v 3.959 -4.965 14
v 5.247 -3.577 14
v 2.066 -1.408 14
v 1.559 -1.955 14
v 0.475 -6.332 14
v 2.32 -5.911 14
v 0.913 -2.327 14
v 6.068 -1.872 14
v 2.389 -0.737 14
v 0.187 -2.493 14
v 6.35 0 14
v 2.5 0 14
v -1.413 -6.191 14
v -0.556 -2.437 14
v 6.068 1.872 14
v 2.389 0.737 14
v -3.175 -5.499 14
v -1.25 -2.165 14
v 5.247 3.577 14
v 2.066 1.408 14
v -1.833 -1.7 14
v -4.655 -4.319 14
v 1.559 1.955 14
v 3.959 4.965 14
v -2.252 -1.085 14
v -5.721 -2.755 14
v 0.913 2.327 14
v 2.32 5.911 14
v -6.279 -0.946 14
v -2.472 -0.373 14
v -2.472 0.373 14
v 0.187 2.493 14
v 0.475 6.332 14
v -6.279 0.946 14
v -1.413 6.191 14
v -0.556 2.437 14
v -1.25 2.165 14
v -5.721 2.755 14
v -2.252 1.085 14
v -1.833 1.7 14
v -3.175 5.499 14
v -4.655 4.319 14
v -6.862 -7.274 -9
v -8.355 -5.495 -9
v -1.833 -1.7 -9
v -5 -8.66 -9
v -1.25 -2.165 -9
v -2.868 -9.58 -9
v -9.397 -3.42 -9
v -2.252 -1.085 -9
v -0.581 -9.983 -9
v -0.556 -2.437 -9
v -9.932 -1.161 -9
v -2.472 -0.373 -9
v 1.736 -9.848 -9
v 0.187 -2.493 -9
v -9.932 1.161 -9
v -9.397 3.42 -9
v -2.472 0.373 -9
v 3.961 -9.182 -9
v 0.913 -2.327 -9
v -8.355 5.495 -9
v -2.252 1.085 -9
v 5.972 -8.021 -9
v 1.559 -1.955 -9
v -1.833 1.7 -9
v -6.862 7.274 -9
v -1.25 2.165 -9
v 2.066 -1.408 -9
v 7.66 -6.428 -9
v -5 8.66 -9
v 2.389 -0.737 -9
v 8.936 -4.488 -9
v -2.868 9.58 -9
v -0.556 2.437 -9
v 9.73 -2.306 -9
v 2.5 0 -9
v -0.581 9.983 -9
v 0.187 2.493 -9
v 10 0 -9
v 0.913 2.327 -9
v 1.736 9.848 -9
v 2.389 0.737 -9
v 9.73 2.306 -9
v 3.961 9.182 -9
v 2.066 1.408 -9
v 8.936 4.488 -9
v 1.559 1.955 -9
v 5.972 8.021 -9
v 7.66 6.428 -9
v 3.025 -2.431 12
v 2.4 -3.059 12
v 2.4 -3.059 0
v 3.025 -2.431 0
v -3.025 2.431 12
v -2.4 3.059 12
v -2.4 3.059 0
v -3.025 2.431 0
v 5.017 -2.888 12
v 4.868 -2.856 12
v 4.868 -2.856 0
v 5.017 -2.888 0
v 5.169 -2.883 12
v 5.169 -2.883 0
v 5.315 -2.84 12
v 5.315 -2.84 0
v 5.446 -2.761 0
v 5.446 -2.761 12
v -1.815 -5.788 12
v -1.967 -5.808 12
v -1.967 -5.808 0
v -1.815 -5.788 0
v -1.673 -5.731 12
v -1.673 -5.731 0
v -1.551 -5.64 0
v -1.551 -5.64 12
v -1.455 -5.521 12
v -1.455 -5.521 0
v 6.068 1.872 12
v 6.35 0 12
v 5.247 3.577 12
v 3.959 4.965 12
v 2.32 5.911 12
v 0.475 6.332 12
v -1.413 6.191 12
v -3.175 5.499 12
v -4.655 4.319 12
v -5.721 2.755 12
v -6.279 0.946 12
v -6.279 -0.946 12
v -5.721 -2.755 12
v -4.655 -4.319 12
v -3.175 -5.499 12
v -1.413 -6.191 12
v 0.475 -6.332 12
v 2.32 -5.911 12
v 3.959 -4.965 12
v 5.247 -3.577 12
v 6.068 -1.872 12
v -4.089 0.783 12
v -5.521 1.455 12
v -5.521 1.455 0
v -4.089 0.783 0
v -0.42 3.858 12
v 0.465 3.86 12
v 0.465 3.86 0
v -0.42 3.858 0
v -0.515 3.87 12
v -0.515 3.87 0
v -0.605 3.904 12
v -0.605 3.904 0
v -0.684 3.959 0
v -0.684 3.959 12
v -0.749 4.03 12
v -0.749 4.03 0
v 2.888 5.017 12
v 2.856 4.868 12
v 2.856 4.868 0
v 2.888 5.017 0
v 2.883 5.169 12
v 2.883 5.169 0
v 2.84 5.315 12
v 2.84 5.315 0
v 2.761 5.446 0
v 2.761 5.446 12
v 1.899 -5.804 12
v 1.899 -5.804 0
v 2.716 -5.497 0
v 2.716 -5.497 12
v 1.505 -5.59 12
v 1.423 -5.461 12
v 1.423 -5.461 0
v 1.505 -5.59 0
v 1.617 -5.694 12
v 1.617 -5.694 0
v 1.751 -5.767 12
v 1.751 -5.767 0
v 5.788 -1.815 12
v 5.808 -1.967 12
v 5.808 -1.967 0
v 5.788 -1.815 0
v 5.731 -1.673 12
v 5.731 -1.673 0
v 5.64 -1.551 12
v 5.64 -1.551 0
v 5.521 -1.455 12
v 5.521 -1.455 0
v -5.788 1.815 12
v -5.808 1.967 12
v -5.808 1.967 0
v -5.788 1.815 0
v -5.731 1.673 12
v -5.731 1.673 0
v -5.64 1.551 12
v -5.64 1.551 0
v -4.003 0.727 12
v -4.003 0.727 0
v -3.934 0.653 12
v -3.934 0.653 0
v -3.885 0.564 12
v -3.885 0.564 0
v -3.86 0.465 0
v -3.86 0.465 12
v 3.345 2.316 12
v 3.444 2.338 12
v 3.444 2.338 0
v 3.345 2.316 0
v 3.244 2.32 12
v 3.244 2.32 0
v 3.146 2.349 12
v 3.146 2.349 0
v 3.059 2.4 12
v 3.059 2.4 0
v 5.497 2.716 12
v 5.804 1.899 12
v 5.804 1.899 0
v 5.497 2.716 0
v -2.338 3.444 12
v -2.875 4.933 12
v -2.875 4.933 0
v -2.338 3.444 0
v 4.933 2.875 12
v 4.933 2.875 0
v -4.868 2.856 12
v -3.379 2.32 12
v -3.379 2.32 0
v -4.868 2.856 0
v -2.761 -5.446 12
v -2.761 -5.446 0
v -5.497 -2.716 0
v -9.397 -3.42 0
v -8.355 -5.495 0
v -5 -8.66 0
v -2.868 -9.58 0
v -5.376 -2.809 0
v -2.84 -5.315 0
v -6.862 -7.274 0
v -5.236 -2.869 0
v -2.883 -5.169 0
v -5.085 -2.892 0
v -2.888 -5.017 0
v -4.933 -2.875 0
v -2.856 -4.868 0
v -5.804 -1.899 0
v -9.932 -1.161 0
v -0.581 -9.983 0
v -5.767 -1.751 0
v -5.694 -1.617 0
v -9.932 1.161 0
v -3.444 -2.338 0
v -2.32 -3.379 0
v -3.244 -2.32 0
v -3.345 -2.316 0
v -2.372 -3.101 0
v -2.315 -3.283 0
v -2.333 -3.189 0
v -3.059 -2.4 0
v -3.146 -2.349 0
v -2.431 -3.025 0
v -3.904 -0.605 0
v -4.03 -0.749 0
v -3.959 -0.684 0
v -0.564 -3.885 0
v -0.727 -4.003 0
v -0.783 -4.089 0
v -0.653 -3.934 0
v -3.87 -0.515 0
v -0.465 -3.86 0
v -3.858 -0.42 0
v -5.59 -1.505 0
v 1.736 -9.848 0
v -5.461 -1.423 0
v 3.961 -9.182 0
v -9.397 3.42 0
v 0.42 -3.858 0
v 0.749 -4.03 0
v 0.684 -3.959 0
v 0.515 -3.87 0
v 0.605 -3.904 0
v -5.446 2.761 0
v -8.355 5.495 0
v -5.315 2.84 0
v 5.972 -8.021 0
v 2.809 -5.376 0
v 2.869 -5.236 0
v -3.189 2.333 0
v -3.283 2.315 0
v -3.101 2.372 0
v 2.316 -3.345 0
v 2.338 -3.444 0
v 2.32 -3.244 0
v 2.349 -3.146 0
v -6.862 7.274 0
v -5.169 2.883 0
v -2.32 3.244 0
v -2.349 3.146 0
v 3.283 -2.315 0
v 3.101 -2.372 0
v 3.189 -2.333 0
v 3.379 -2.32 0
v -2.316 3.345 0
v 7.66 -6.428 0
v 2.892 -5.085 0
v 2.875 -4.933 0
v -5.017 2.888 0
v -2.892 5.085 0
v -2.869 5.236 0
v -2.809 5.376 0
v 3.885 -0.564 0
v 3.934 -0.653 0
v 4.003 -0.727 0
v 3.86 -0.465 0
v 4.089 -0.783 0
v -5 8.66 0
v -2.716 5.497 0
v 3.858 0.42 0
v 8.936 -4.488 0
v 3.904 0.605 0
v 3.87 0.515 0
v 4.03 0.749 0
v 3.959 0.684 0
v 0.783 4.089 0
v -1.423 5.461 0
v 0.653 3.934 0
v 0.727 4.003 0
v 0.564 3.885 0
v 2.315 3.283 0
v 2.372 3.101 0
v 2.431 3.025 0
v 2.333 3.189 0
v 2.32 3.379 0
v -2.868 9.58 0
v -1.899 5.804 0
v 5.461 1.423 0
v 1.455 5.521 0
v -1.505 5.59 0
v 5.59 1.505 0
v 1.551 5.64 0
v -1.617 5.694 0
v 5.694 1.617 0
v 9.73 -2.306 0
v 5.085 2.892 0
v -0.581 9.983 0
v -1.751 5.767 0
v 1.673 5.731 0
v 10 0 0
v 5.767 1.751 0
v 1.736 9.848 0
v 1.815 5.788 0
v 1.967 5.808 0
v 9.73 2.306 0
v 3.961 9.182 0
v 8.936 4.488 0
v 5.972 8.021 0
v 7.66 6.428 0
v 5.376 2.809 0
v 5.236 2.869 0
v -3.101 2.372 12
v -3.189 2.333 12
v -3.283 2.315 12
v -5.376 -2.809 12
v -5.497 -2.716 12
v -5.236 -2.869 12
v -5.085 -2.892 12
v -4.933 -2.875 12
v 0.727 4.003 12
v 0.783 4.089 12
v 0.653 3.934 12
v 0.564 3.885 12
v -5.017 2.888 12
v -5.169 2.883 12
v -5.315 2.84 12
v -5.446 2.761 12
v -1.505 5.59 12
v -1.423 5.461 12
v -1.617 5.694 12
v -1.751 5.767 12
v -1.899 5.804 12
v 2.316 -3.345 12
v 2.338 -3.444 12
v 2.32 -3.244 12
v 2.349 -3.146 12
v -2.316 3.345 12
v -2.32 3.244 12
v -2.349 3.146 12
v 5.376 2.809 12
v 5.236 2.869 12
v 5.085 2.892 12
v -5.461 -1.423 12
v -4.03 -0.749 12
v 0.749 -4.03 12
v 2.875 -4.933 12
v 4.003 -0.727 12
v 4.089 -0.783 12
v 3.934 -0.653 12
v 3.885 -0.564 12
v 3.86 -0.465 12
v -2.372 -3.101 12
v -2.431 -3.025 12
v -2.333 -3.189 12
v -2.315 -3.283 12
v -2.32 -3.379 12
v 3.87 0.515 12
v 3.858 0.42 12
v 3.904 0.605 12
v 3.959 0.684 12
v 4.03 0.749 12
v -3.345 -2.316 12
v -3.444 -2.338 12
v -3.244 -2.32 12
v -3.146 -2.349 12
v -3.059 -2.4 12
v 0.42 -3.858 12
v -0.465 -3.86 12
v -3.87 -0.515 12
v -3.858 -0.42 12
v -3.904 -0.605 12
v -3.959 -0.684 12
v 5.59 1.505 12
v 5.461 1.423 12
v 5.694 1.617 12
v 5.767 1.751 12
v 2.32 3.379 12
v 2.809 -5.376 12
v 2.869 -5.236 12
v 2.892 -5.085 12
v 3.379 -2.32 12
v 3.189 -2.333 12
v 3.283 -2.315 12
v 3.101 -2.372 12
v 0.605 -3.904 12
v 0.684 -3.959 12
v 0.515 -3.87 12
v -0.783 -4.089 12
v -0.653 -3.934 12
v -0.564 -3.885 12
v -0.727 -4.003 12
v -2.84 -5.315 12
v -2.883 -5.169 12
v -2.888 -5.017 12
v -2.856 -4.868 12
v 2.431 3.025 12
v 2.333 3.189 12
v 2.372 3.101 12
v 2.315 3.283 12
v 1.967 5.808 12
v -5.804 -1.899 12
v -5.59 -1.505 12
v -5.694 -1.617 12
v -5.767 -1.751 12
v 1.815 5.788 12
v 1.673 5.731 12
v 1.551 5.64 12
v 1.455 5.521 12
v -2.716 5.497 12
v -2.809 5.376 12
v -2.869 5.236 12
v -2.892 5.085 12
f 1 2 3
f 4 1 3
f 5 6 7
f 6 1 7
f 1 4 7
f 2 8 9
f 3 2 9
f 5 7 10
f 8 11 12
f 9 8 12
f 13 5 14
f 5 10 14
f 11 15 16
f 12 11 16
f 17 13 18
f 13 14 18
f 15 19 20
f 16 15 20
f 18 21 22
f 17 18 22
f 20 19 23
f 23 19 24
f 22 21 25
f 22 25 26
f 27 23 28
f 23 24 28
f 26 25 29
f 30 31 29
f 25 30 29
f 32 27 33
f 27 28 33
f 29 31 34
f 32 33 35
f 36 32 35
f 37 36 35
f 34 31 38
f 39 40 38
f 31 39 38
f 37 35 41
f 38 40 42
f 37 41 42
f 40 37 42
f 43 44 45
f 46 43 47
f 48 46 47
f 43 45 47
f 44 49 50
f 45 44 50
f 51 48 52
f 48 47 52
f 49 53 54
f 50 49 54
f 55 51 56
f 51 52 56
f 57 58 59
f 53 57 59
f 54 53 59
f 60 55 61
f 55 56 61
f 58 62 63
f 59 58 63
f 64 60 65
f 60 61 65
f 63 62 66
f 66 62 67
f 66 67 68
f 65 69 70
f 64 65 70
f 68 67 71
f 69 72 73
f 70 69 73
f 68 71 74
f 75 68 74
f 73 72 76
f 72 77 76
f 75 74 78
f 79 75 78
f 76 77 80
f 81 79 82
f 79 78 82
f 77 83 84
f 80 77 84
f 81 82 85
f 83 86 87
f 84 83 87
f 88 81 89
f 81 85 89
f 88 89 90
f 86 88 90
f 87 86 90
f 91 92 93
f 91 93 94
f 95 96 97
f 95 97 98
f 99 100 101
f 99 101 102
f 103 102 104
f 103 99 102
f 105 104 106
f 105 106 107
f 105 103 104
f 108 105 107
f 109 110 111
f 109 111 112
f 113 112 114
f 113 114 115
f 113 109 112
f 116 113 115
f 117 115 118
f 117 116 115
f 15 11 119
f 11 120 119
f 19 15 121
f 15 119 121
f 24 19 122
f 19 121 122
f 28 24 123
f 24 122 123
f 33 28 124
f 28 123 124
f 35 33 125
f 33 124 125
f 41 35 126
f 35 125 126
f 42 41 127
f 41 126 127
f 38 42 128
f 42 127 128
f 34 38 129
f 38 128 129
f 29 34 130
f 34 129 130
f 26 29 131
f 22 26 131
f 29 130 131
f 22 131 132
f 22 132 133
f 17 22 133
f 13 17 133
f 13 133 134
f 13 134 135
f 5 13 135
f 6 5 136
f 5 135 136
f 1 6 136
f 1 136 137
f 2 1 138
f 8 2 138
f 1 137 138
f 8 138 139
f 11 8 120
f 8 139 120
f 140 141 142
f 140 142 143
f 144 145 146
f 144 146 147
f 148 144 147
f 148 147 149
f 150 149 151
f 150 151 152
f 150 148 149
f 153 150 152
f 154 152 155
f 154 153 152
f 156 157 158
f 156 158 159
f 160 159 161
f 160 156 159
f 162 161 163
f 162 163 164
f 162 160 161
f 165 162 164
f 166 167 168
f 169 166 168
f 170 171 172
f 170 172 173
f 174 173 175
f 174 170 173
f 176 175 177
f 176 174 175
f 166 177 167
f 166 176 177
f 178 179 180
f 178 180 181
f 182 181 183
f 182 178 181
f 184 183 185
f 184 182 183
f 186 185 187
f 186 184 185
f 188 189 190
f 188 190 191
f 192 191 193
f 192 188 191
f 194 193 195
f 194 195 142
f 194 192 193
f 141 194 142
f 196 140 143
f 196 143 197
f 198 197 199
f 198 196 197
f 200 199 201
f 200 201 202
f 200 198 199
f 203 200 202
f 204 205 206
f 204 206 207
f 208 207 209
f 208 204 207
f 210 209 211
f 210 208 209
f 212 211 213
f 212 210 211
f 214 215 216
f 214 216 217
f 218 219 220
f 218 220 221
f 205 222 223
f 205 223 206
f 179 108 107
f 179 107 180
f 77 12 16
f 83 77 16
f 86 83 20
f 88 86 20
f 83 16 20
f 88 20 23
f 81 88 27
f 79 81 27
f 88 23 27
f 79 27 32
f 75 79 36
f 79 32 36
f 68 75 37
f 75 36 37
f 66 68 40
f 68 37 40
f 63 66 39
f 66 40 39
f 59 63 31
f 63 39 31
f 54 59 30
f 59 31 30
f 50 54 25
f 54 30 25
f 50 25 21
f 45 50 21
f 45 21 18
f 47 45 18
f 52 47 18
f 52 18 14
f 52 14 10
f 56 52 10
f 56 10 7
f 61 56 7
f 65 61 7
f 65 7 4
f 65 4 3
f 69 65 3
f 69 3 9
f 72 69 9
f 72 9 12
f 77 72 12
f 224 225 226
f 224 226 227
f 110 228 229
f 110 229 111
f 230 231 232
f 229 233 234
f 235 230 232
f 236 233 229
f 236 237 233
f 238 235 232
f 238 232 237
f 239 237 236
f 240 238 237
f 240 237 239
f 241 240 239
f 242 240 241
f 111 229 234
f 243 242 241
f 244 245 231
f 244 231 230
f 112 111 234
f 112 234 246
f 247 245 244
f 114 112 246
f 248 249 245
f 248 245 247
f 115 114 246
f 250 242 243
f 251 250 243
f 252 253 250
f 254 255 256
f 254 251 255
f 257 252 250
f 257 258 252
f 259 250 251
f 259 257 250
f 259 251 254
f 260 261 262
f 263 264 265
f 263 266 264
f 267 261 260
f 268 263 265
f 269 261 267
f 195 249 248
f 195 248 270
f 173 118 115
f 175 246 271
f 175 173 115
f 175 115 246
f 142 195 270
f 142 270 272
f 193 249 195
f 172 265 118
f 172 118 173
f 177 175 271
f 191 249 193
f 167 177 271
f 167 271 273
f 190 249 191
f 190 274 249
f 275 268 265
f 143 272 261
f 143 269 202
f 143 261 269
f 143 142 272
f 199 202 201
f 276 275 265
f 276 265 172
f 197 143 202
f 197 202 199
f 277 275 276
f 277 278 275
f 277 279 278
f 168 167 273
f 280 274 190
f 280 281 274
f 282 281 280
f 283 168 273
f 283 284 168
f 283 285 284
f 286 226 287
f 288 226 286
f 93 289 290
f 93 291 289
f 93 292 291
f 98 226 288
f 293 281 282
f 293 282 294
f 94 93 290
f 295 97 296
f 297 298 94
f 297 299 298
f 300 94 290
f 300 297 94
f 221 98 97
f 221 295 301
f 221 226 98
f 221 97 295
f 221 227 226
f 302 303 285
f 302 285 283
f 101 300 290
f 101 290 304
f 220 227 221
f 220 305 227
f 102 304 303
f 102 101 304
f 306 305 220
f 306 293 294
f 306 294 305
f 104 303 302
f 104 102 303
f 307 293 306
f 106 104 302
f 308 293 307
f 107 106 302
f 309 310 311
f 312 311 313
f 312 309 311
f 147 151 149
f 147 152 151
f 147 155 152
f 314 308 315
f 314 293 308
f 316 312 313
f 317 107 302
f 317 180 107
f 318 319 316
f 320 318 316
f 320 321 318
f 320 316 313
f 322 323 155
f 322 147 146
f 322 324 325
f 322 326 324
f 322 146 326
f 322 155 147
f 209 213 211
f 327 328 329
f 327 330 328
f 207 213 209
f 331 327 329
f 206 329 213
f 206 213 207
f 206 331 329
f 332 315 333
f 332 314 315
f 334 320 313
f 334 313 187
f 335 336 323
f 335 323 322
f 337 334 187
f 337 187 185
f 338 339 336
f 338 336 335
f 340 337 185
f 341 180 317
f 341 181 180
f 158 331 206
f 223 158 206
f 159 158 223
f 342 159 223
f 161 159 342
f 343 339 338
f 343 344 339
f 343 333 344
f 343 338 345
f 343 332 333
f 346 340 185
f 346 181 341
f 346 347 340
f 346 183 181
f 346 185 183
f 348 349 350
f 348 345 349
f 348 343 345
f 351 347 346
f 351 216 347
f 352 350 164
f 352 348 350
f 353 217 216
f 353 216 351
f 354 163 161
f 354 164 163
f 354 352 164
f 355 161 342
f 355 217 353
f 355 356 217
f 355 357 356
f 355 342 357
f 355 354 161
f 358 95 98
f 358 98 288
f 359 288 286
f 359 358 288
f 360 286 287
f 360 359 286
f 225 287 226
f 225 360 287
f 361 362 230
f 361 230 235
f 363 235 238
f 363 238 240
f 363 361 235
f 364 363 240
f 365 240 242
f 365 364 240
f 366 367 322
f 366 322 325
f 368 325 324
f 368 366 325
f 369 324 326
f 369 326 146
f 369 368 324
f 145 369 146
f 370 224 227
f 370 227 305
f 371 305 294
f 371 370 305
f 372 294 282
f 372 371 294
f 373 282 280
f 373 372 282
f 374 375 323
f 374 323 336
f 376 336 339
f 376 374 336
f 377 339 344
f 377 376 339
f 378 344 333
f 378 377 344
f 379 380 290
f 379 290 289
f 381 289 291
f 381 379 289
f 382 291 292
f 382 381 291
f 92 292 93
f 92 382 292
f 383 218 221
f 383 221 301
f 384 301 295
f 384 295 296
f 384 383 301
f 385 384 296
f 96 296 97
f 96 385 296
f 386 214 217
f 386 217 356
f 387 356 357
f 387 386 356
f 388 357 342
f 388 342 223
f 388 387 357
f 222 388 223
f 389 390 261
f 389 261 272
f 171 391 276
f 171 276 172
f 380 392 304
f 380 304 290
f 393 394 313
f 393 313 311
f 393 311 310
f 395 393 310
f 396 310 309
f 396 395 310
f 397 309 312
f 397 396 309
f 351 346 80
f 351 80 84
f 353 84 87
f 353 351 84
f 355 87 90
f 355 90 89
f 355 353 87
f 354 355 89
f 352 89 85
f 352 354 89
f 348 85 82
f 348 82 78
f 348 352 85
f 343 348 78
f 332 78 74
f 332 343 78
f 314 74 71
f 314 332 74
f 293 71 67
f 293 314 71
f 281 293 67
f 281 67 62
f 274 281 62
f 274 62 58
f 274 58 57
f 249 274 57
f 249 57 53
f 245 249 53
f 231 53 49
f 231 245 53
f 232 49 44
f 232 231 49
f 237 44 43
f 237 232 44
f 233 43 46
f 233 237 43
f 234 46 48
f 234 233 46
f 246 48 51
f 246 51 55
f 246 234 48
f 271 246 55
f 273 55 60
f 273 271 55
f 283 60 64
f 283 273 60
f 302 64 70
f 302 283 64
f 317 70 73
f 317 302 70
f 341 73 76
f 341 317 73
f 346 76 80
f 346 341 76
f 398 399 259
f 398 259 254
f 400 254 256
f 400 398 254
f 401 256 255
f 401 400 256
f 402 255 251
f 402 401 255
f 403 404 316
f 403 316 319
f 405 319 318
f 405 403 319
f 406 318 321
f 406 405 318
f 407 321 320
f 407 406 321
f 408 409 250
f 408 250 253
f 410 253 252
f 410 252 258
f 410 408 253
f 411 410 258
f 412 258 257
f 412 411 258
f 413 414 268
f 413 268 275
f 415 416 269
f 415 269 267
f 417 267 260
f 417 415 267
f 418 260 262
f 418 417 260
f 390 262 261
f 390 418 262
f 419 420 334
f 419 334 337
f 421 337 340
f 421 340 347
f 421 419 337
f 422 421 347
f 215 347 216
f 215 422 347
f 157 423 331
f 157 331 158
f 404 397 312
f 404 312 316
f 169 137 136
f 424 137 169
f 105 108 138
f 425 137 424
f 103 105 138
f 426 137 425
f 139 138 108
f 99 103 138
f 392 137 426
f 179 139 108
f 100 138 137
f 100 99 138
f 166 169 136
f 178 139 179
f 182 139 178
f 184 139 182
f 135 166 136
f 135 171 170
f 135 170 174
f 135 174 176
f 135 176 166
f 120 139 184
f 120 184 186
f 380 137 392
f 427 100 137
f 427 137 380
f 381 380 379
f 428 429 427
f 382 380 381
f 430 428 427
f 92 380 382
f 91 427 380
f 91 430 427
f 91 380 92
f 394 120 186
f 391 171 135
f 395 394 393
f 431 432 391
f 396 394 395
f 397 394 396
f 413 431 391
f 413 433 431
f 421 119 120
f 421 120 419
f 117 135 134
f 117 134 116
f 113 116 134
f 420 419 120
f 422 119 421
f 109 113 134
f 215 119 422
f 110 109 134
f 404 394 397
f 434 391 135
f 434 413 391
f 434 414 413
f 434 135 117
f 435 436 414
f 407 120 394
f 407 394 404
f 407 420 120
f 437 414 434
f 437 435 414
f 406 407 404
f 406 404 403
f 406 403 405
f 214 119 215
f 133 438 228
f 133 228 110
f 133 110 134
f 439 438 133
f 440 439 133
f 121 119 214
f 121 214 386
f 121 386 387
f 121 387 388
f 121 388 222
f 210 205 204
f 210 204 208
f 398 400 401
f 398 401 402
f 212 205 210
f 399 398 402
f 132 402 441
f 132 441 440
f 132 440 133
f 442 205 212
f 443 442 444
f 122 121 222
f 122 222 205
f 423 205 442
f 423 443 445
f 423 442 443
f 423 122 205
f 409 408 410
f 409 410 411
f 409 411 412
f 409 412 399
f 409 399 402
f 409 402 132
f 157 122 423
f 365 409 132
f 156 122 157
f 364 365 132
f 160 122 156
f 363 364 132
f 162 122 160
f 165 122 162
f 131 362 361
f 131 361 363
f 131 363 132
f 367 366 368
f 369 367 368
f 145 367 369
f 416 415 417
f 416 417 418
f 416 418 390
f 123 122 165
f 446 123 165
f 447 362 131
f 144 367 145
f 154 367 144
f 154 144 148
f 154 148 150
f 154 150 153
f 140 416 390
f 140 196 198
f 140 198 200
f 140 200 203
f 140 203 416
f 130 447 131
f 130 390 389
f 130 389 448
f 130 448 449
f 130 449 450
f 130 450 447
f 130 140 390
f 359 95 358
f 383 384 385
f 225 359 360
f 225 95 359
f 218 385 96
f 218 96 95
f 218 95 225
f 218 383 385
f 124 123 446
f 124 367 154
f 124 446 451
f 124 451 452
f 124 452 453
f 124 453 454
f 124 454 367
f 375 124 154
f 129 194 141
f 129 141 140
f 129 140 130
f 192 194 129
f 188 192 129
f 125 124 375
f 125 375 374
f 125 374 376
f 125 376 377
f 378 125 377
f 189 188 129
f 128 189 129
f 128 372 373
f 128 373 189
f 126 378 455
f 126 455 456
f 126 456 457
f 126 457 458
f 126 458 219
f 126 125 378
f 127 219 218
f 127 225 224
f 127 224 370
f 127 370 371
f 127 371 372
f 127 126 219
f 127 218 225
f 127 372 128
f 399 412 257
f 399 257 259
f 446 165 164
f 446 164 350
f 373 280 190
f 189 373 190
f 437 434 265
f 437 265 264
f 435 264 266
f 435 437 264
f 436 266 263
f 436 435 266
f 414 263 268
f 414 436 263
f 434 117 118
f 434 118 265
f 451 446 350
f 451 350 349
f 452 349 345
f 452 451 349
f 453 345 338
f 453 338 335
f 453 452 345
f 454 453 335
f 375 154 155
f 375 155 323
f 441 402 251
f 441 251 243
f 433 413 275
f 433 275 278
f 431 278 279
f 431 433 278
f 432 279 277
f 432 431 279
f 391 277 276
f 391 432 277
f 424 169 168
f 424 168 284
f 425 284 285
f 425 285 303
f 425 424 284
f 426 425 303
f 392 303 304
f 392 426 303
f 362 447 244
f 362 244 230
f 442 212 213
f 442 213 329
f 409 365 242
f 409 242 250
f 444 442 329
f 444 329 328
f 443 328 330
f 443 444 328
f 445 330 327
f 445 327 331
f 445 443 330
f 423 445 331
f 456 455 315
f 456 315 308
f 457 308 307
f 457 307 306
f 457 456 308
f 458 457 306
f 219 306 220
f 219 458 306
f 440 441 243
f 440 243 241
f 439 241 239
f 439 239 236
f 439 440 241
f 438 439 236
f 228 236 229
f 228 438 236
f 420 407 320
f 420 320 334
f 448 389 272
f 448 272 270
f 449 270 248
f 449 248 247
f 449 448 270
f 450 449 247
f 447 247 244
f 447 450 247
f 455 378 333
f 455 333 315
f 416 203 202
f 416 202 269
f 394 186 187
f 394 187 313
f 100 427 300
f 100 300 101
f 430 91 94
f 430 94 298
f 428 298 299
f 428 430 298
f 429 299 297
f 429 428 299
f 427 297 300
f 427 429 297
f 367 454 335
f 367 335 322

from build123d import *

# Parameters (mm, degrees)
SKETCH1_W                    = 6.35
SKETCH1_H                    = 2
BOSS_EXTRUDE1_DEPTH          = 12
SKETCH3_R                    = 10
BOSS_EXTRUDE2_DEPTH          = 9
F_5_0_5_DIAMETER_HOLE1_D     = 5
F_5_0_5_DIAMETER_HOLE1_DEPTH = 23


with BuildPart() as part:
    # Sketch1 → Revolve1 (revolve)
    with BuildSketch(Plane(origin=(0, 0, 0), x_dir=(1, 0, 0), z_dir=(0, 1, 0))):
        with Locations((3.175, -13)):
            Rectangle(SKETCH1_W, SKETCH1_H)
    revolve(axis=Axis((0, 0, 12), (0, 0, 1)))

    # Sketch2 → Boss-Extrude1 (add)
    with BuildSketch(Plane(origin=(0, 0, 12), x_dir=(-1, 0, 0), z_dir=(0, 0, -1))):
        with BuildLine():
            Line((-2.875186934, -4.932808292), (-2.337585335, -3.444483277))
            ThreePointArc((-2.337585335, -3.444483277), (-2.320135009, -3.243617805), (-2.400419134, -3.058669404))
            Line((-2.400419134, -3.058669404), (-3.024832437, -2.4306198))
            ThreePointArc((-3.024832437, -2.4306198), (-3.188663853, -2.33311555), (-3.378852537, -2.3198462))
            Line((-3.378852537, -2.3198462), (-4.867663341, -2.855580601))
            ThreePointArc((-4.867663341, -2.855580601), (-5.169157529, -2.882959187), (-5.446384241, -2.761329901))
            Line((-5.446384241, -2.761329901), (-5.807587241, -1.966542116))
            ThreePointArc((-5.807587241, -1.966542116), (-5.731084845, -1.673369369), (-5.521086391, -1.454958001))
            Line((-5.521086391, -1.454958001), (-4.088539945, -0.782695026))
            ThreePointArc((-4.088539945, -0.782695026), (-3.934167363, -0.653000933), (-3.860158544, -0.465453215))
            Line((-3.860158544, -0.465453215), (-3.857587291, 0.420171804))
            ThreePointArc((-3.857587291, 0.420171804), (-3.904487679, 0.604964025), (-4.029588541, 0.748830581))
            Line((-4.029588541, 0.748830581), (-5.461158184, 1.422757368))
            ThreePointArc((-5.461158184, 1.422757368), (-5.693706352, 1.61658637), (-5.803730347, 1.89862015))
            Line((-5.803730347, 1.89862015), (-5.497139595, 2.716029083))
            ThreePointArc((-5.497139595, 2.716029083), (-5.235739777, 2.86923814), (-4.93280828, 2.875186941))
            Line((-4.93280828, 2.875186941), (-3.444483265, 2.337585342))
            ThreePointArc((-3.444483265, 2.337585342), (-3.243617793, 2.320135016), (-3.058669391, 2.40041914))
            Line((-3.058669391, 2.40041914), (-2.430619781, 3.024832451))
            ThreePointArc((-2.430619781, 3.024832451), (-2.333115531, 3.188663866), (-2.319846181, 3.378852551))
            Line((-2.319846181, 3.378852551), (-2.855580582, 4.867663354))
            ThreePointArc((-2.855580582, 4.867663354), (-2.882959167, 5.169157543), (-2.761329882, 5.446384254))
            Line((-2.761329882, 5.446384254), (-1.966542082, 5.807587254))
            ThreePointArc((-1.966542082, 5.807587254), (-1.673369335, 5.731084833), (-1.454957982, 5.521086354))
            Line((-1.454957982, 5.521086354), (-0.782695007, 4.088539908))
            ThreePointArc((-0.782695007, 4.088539908), (-0.653000914, 3.934167326), (-0.465453196, 3.860158506))
            Line((-0.465453196, 3.860158506), (0.420171836, 3.857587254))
            ThreePointArc((0.420171836, 3.857587254), (0.604964057, 3.904487642), (0.748830613, 4.029588503))
            Line((0.748830613, 4.029588503), (1.4227574, 5.461158146))
            ThreePointArc((1.4227574, 5.461158146), (1.616586402, 5.693706315), (1.898620182, 5.80373031))
            Line((1.898620182, 5.80373031), (2.716029116, 5.497139558))
            ThreePointArc((2.716029116, 5.497139558), (2.869238173, 5.235739739), (2.875186973, 4.932808242))
            Line((2.875186973, 4.932808242), (2.337585375, 3.444483227))
            ThreePointArc((2.337585375, 3.444483227), (2.320135048, 3.243617755), (2.400419173, 3.058669354))
            Line((2.400419173, 3.058669354), (3.024832497, 2.43061973))
            ThreePointArc((3.024832497, 2.43061973), (3.188663912, 2.33311548), (3.378852597, 2.31984613))
            Line((3.378852597, 2.31984613), (4.8676634, 2.855580531))
            ThreePointArc((4.8676634, 2.855580531), (5.169157589, 2.882959117), (5.4463843, 2.761329831))
            Line((5.4463843, 2.761329831), (5.8075873, 1.966542031))
            ThreePointArc((5.8075873, 1.966542031), (5.731084879, 1.673369284), (5.5210864, 1.454957931))
            Line((5.5210864, 1.454957931), (4.088539954, 0.782694956))
            ThreePointArc((4.088539954, 0.782694956), (3.934167372, 0.653000863), (3.860158552, 0.465453145))
            Line((3.860158552, 0.465453145), (3.8575873, -0.420171864))
            ThreePointArc((3.8575873, -0.420171864), (3.904487688, -0.604964085), (4.029588549, -0.748830641))
            Line((4.029588549, -0.748830641), (5.461158192, -1.422757428))
            ThreePointArc((5.461158192, -1.422757428), (5.693706361, -1.616586429), (5.803730356, -1.898620209))
            Line((5.803730356, -1.898620209), (5.497139604, -2.716029143))
            ThreePointArc((5.497139604, -2.716029143), (5.235739785, -2.8692382), (4.932808288, -2.875187))
            Line((4.932808288, -2.875187), (3.444483273, -2.337585402))
            ThreePointArc((3.444483273, -2.337585402), (3.243617801, -2.320135075), (3.0586694, -2.4004192))
            Line((3.0586694, -2.4004192), (2.4306198, -3.0248325))
            ThreePointArc((2.4306198, -3.0248325), (2.33311555, -3.188663916), (2.3198462, -3.3788526))
            Line((2.3198462, -3.3788526), (2.855580601, -4.867663404))
            ThreePointArc((2.855580601, -4.867663404), (2.882959186, -5.169157592), (2.761329901, -5.446384304))
            Line((2.761329901, -5.446384304), (1.966542101, -5.807587304))
            ThreePointArc((1.966542101, -5.807587304), (1.673369354, -5.731084882), (1.454958001, -5.521086404))
            Line((1.454958001, -5.521086404), (0.782695026, -4.088539957))
            ThreePointArc((0.782695026, -4.088539957), (0.653000933, -3.934167376), (0.465453215, -3.860158556))
            Line((0.465453215, -3.860158556), (-0.420171797, -3.857587303))
            ThreePointArc((-0.420171797, -3.857587303), (-0.604964018, -3.904487692), (-0.748830574, -4.029588553))
            Line((-0.748830574, -4.029588553), (-1.422757361, -5.461158196))
            ThreePointArc((-1.422757361, -5.461158196), (-1.616586363, -5.693706365), (-1.898620143, -5.80373036))
            Line((-1.898620143, -5.80373036), (-2.716029077, -5.497139607))
            ThreePointArc((-2.716029077, -5.497139607), (-2.869238134, -5.235739789), (-2.875186934, -4.932808292))
        make_face()
    extrude(amount=BOSS_EXTRUDE1_DEPTH)

    # Sketch3 → Boss-Extrude2 (add)
    with BuildSketch(Plane.XY):
        Circle(SKETCH3_R)
    extrude(amount=-BOSS_EXTRUDE2_DEPTH)

    # Ø5.0 (5) Diameter Hole1
    with Locations(Plane(origin=(0, 0, -9), x_dir=(-1, 0, 0), z_dir=(0, 0, -1))):
        with Locations((0, 0)):
            Hole(F_5_0_5_DIAMETER_HOLE1_D / 2, depth=F_5_0_5_DIAMETER_HOLE1_DEPTH)


solid = part.part
